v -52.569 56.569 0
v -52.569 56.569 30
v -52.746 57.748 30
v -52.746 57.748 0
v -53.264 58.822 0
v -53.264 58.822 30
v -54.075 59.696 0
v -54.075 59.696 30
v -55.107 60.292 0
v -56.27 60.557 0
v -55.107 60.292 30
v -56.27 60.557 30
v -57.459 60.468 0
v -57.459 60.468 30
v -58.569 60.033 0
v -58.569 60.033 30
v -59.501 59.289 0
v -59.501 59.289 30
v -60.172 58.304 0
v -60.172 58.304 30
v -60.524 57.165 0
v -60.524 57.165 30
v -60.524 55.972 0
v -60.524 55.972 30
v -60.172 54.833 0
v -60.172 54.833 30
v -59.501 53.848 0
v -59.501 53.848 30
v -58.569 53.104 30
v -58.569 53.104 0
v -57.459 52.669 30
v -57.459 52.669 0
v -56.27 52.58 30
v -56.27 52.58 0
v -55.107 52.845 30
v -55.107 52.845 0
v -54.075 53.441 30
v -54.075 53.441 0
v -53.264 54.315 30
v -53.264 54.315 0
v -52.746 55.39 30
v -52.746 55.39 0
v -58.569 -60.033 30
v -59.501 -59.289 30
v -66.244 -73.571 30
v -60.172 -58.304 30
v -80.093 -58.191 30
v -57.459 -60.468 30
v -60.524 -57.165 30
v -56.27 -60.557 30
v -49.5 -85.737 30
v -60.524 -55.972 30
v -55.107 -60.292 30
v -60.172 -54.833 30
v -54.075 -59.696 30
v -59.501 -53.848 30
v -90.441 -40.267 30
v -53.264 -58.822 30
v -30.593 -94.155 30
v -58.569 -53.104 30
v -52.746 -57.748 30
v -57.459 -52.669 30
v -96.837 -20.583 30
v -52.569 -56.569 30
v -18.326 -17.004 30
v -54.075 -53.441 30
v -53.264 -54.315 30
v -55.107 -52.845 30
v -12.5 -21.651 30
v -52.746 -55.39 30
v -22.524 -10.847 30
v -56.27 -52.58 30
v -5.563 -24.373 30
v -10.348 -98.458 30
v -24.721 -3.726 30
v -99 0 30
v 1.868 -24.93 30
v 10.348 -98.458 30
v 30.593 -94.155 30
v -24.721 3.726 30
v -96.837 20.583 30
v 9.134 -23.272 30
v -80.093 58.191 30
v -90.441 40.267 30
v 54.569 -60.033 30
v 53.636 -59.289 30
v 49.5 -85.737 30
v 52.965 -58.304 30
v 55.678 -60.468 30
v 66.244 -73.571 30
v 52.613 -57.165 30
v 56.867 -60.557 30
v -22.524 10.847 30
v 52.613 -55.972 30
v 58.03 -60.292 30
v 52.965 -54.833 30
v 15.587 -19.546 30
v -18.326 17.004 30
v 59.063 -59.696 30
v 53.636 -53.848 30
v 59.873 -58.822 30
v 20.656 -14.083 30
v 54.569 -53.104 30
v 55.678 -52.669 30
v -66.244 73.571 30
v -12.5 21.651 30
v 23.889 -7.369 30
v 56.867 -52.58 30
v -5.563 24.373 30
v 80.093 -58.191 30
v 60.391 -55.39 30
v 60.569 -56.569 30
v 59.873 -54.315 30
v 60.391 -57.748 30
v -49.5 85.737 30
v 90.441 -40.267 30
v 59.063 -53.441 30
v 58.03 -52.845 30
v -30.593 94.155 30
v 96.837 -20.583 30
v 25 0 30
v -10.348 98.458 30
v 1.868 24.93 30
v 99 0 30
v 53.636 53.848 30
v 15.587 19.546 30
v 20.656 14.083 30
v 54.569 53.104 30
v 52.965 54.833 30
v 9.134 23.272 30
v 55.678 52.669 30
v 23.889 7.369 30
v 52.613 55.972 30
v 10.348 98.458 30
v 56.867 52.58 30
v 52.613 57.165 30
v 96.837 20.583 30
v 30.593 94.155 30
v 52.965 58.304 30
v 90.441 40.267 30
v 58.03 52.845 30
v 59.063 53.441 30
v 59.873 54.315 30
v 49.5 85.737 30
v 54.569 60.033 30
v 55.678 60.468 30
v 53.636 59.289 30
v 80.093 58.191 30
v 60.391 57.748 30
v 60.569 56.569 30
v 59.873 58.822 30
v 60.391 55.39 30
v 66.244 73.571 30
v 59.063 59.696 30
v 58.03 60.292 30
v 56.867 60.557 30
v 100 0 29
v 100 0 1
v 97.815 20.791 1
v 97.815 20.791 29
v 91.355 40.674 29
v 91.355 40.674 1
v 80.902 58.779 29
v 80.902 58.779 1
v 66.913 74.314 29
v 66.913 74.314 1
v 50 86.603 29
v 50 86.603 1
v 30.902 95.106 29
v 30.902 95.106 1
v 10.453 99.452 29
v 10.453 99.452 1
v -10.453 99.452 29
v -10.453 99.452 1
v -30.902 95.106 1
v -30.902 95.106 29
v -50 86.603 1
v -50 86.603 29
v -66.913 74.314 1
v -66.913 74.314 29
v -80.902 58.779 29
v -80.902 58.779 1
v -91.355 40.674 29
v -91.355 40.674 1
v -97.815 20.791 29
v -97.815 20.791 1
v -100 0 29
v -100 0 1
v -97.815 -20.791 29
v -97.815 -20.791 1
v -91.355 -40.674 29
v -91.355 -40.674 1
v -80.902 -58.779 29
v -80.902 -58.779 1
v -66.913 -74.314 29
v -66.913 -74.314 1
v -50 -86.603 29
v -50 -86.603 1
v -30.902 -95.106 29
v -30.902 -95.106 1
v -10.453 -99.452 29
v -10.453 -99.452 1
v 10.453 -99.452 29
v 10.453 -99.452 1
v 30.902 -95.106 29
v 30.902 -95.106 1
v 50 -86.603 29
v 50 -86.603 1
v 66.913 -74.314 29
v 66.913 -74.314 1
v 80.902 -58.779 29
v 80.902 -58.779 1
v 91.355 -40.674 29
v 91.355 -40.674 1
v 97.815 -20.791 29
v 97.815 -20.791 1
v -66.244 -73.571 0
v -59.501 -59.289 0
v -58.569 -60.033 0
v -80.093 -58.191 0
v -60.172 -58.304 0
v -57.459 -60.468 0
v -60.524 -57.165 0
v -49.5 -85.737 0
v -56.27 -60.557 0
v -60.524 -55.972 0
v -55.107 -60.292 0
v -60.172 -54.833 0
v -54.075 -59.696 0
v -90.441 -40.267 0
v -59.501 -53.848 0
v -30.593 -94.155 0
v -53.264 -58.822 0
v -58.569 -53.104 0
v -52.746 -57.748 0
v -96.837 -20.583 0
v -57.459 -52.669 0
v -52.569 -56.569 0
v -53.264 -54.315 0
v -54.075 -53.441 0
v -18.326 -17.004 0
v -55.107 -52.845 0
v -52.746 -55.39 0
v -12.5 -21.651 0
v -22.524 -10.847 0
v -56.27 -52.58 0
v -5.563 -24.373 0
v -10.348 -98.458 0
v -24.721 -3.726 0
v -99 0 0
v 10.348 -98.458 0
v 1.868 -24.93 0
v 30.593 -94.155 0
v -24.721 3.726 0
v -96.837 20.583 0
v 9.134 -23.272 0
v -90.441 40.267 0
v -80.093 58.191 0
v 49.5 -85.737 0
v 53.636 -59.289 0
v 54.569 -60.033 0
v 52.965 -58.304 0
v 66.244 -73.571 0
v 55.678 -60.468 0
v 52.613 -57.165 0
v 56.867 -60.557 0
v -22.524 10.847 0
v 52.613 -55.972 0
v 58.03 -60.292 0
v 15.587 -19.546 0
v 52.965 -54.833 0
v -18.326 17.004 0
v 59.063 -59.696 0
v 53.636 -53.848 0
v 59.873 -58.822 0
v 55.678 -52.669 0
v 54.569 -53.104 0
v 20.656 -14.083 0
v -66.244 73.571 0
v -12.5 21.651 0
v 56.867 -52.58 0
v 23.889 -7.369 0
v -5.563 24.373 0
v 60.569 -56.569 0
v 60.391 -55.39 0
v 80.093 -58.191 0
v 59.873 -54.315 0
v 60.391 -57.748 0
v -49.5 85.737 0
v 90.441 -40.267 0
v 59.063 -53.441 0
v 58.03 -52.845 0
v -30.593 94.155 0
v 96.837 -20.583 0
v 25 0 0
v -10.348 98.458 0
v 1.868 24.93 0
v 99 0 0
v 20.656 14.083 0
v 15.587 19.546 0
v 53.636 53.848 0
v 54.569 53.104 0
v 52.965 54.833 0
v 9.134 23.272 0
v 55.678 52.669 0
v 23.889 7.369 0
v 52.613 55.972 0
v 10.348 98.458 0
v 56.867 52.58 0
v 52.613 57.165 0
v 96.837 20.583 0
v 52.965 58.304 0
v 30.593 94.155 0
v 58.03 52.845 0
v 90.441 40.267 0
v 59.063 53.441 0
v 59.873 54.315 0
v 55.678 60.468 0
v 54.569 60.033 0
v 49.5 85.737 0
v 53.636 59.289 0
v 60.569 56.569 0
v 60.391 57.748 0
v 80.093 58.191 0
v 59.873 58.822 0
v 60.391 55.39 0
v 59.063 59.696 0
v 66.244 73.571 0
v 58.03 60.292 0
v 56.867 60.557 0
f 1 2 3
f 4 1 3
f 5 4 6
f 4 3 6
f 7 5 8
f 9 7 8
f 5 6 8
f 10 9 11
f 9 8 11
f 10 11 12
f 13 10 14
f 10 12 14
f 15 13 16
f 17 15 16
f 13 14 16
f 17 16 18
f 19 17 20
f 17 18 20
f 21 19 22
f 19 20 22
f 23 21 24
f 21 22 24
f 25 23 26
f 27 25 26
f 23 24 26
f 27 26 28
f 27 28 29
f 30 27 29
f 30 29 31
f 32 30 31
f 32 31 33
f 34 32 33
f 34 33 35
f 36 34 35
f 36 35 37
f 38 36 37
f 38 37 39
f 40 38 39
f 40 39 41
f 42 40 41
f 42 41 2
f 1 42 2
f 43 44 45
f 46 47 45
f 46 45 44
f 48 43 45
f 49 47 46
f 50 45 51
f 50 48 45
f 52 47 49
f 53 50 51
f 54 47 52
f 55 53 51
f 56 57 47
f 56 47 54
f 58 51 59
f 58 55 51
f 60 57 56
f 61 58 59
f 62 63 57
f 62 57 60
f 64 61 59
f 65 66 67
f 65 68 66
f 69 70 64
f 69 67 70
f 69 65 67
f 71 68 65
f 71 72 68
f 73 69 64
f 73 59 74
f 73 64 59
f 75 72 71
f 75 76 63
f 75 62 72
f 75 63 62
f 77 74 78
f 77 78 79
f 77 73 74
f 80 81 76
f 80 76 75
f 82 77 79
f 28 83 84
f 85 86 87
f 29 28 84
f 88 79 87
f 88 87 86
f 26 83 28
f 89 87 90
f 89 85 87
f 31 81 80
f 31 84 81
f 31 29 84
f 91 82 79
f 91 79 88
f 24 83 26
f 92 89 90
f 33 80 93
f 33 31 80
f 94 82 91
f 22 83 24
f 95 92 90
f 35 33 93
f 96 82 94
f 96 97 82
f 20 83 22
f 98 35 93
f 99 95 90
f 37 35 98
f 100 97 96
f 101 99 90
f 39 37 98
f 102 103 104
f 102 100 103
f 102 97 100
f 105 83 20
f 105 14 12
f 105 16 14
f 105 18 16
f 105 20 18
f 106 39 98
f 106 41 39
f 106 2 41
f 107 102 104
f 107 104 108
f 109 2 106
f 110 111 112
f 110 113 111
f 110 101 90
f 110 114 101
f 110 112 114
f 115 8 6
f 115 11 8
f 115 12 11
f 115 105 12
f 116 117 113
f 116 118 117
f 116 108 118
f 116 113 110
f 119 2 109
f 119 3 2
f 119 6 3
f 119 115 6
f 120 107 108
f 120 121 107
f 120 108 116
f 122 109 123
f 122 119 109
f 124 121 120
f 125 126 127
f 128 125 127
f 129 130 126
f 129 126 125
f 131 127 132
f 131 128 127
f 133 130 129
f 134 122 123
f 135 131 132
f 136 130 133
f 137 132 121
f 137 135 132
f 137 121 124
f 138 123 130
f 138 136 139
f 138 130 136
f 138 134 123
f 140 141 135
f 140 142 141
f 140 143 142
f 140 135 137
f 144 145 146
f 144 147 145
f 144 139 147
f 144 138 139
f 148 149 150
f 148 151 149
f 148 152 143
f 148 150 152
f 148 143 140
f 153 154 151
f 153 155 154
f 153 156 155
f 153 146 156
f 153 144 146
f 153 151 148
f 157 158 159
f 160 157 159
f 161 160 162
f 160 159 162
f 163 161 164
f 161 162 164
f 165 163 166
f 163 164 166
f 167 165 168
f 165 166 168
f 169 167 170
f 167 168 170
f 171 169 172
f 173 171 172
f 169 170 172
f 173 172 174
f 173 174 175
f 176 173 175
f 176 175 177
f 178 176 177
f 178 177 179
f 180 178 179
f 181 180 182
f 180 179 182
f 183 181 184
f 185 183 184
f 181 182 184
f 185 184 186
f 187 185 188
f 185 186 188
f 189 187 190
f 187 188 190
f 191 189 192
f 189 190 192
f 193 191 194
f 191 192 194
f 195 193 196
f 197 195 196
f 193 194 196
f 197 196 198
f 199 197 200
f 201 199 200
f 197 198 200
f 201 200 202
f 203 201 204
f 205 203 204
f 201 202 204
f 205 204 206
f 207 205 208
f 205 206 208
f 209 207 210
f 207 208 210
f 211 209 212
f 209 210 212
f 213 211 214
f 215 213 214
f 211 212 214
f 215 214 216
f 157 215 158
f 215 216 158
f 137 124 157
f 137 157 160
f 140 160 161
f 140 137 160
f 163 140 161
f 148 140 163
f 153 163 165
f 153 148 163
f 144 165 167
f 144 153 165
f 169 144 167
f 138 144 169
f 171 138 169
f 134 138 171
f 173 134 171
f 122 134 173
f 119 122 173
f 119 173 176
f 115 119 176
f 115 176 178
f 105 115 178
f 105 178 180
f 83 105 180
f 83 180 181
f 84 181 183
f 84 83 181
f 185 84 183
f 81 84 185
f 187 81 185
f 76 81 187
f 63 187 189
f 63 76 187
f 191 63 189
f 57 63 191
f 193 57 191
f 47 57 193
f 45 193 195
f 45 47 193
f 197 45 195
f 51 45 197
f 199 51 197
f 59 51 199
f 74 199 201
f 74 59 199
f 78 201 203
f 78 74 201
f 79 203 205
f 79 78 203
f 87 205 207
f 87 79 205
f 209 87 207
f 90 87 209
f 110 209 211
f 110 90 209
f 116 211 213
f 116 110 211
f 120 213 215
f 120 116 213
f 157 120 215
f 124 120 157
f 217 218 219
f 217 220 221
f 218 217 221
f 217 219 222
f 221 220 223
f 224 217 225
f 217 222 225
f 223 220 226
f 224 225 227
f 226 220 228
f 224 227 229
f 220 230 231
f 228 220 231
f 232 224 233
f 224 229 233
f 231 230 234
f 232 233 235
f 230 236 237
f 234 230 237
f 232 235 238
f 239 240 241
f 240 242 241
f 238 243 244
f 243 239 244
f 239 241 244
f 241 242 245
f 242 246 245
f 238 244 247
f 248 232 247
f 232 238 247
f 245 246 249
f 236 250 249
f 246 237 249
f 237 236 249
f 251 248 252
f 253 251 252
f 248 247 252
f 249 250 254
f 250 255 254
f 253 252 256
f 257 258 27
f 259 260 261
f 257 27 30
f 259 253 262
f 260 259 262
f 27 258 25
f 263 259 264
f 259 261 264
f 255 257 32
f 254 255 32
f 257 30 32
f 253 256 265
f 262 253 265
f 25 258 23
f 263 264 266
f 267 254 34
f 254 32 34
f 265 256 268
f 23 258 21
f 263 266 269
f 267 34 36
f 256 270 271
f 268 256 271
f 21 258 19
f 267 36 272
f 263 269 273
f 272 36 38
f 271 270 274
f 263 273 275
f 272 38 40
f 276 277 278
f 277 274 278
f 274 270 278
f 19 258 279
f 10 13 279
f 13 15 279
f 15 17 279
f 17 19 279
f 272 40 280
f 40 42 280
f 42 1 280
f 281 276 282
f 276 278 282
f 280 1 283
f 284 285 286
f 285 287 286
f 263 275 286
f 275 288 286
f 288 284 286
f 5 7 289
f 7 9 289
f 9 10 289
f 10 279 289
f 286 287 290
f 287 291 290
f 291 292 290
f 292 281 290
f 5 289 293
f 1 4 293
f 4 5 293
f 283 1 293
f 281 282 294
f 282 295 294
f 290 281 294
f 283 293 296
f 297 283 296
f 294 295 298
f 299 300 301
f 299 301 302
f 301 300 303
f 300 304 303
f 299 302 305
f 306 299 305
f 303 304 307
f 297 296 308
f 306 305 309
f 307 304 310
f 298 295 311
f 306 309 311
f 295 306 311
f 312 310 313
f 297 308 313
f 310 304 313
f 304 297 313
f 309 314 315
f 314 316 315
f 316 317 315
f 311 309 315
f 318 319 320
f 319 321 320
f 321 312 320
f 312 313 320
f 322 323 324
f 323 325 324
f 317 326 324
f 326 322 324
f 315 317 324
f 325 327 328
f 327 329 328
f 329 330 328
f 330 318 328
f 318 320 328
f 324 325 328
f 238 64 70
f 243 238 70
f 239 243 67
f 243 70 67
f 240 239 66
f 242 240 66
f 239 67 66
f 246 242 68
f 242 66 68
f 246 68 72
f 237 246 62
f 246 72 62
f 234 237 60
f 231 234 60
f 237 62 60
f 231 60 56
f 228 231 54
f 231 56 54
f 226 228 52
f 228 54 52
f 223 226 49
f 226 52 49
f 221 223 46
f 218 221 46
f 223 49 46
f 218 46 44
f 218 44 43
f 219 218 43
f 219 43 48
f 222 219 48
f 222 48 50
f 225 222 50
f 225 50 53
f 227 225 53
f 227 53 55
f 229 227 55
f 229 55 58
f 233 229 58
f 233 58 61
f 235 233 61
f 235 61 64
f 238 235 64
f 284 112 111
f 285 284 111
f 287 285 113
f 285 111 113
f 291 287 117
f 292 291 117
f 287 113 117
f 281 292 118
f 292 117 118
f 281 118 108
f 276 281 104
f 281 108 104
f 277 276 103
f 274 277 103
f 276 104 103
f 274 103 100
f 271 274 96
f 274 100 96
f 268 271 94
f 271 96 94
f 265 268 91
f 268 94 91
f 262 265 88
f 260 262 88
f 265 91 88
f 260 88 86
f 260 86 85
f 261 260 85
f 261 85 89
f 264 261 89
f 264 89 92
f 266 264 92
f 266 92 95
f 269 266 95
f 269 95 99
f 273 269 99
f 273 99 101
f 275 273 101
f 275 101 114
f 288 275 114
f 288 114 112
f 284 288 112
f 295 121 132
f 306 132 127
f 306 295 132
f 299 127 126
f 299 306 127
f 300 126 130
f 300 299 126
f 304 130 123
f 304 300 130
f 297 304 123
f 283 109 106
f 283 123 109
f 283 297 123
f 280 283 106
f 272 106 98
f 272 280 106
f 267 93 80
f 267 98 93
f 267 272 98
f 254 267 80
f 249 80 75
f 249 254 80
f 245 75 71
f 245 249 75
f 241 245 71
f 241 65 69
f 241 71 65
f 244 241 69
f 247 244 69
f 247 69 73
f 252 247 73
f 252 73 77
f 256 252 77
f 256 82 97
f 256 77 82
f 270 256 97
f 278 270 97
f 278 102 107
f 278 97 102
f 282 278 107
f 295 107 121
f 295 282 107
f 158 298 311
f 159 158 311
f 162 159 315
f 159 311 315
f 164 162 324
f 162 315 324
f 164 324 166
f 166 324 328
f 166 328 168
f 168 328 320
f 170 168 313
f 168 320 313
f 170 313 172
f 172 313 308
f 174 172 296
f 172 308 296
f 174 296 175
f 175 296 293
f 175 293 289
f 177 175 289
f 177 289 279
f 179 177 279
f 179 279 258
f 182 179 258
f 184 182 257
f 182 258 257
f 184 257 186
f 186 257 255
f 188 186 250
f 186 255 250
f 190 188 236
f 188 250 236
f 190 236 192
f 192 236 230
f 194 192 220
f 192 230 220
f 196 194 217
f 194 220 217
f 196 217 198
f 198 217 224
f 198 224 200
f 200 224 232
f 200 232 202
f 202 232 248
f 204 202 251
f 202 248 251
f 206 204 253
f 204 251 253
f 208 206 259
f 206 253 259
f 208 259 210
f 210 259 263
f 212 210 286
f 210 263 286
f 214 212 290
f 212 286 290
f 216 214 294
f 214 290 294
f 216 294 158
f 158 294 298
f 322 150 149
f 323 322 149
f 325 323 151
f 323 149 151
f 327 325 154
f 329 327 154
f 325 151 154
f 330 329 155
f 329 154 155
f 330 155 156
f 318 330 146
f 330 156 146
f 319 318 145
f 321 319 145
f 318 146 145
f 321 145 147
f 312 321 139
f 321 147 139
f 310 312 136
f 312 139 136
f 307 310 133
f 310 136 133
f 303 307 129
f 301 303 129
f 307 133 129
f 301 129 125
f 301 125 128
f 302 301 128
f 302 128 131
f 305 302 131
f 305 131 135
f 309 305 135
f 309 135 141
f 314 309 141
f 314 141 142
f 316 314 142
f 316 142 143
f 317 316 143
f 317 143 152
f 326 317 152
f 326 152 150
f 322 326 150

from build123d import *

# Parameters (mm, degrees)
SKETCH1_R           = 100
BOSS_EXTRUDE1_DEPTH = 30
SKETCH2_R           = 25
CUT_EXTRUDE2_DEPTH  = 40
SKETCH3_R           = 4
CUT_EXTRUDE3_DEPTH  = 40
CHAMFER1_SIZE       = 1
CHAMFER2_SIZE       = 1


with BuildPart() as part:
    # Sketch1 → Boss-Extrude1 (new body)
    with BuildSketch(Plane.XY):
        Circle(SKETCH1_R)
    extrude(amount=BOSS_EXTRUDE1_DEPTH)

    # Sketch2 → Cut-Extrude2 (cut)
    with BuildSketch(Plane.XY):
        Circle(SKETCH2_R)
    extrude(amount=CUT_EXTRUDE2_DEPTH, mode=Mode.SUBTRACT)

    # Sketch3 → Cut-Extrude3 (cut)
    with BuildSketch(Plane.XY.offset(30)):
        with Locations((56.568542495, 56.568542495)):
            Circle(SKETCH3_R)
        with Locations((-56.568542495, 56.568542495)):
            Circle(SKETCH3_R)
        with Locations((-56.568542495, -56.568542495)):
            Circle(SKETCH3_R)
        with Locations((56.568542495, -56.568542495)):
            Circle(SKETCH3_R)
    extrude(amount=-CUT_EXTRUDE3_DEPTH, mode=Mode.SUBTRACT)

    # Chamfer1
    chamfer1_edges = [part.edges().sort_by_distance(p)[0] for p in [
        (-100, 0, 0),
    ]]
    chamfer(chamfer1_edges, length=CHAMFER1_SIZE)

    # Chamfer2
    chamfer2_edges = [part.edges().sort_by_distance(p)[0] for p in [
        (-100, 0, 30),
    ]]
    chamfer(chamfer2_edges, length=CHAMFER2_SIZE)


solid = part.part
